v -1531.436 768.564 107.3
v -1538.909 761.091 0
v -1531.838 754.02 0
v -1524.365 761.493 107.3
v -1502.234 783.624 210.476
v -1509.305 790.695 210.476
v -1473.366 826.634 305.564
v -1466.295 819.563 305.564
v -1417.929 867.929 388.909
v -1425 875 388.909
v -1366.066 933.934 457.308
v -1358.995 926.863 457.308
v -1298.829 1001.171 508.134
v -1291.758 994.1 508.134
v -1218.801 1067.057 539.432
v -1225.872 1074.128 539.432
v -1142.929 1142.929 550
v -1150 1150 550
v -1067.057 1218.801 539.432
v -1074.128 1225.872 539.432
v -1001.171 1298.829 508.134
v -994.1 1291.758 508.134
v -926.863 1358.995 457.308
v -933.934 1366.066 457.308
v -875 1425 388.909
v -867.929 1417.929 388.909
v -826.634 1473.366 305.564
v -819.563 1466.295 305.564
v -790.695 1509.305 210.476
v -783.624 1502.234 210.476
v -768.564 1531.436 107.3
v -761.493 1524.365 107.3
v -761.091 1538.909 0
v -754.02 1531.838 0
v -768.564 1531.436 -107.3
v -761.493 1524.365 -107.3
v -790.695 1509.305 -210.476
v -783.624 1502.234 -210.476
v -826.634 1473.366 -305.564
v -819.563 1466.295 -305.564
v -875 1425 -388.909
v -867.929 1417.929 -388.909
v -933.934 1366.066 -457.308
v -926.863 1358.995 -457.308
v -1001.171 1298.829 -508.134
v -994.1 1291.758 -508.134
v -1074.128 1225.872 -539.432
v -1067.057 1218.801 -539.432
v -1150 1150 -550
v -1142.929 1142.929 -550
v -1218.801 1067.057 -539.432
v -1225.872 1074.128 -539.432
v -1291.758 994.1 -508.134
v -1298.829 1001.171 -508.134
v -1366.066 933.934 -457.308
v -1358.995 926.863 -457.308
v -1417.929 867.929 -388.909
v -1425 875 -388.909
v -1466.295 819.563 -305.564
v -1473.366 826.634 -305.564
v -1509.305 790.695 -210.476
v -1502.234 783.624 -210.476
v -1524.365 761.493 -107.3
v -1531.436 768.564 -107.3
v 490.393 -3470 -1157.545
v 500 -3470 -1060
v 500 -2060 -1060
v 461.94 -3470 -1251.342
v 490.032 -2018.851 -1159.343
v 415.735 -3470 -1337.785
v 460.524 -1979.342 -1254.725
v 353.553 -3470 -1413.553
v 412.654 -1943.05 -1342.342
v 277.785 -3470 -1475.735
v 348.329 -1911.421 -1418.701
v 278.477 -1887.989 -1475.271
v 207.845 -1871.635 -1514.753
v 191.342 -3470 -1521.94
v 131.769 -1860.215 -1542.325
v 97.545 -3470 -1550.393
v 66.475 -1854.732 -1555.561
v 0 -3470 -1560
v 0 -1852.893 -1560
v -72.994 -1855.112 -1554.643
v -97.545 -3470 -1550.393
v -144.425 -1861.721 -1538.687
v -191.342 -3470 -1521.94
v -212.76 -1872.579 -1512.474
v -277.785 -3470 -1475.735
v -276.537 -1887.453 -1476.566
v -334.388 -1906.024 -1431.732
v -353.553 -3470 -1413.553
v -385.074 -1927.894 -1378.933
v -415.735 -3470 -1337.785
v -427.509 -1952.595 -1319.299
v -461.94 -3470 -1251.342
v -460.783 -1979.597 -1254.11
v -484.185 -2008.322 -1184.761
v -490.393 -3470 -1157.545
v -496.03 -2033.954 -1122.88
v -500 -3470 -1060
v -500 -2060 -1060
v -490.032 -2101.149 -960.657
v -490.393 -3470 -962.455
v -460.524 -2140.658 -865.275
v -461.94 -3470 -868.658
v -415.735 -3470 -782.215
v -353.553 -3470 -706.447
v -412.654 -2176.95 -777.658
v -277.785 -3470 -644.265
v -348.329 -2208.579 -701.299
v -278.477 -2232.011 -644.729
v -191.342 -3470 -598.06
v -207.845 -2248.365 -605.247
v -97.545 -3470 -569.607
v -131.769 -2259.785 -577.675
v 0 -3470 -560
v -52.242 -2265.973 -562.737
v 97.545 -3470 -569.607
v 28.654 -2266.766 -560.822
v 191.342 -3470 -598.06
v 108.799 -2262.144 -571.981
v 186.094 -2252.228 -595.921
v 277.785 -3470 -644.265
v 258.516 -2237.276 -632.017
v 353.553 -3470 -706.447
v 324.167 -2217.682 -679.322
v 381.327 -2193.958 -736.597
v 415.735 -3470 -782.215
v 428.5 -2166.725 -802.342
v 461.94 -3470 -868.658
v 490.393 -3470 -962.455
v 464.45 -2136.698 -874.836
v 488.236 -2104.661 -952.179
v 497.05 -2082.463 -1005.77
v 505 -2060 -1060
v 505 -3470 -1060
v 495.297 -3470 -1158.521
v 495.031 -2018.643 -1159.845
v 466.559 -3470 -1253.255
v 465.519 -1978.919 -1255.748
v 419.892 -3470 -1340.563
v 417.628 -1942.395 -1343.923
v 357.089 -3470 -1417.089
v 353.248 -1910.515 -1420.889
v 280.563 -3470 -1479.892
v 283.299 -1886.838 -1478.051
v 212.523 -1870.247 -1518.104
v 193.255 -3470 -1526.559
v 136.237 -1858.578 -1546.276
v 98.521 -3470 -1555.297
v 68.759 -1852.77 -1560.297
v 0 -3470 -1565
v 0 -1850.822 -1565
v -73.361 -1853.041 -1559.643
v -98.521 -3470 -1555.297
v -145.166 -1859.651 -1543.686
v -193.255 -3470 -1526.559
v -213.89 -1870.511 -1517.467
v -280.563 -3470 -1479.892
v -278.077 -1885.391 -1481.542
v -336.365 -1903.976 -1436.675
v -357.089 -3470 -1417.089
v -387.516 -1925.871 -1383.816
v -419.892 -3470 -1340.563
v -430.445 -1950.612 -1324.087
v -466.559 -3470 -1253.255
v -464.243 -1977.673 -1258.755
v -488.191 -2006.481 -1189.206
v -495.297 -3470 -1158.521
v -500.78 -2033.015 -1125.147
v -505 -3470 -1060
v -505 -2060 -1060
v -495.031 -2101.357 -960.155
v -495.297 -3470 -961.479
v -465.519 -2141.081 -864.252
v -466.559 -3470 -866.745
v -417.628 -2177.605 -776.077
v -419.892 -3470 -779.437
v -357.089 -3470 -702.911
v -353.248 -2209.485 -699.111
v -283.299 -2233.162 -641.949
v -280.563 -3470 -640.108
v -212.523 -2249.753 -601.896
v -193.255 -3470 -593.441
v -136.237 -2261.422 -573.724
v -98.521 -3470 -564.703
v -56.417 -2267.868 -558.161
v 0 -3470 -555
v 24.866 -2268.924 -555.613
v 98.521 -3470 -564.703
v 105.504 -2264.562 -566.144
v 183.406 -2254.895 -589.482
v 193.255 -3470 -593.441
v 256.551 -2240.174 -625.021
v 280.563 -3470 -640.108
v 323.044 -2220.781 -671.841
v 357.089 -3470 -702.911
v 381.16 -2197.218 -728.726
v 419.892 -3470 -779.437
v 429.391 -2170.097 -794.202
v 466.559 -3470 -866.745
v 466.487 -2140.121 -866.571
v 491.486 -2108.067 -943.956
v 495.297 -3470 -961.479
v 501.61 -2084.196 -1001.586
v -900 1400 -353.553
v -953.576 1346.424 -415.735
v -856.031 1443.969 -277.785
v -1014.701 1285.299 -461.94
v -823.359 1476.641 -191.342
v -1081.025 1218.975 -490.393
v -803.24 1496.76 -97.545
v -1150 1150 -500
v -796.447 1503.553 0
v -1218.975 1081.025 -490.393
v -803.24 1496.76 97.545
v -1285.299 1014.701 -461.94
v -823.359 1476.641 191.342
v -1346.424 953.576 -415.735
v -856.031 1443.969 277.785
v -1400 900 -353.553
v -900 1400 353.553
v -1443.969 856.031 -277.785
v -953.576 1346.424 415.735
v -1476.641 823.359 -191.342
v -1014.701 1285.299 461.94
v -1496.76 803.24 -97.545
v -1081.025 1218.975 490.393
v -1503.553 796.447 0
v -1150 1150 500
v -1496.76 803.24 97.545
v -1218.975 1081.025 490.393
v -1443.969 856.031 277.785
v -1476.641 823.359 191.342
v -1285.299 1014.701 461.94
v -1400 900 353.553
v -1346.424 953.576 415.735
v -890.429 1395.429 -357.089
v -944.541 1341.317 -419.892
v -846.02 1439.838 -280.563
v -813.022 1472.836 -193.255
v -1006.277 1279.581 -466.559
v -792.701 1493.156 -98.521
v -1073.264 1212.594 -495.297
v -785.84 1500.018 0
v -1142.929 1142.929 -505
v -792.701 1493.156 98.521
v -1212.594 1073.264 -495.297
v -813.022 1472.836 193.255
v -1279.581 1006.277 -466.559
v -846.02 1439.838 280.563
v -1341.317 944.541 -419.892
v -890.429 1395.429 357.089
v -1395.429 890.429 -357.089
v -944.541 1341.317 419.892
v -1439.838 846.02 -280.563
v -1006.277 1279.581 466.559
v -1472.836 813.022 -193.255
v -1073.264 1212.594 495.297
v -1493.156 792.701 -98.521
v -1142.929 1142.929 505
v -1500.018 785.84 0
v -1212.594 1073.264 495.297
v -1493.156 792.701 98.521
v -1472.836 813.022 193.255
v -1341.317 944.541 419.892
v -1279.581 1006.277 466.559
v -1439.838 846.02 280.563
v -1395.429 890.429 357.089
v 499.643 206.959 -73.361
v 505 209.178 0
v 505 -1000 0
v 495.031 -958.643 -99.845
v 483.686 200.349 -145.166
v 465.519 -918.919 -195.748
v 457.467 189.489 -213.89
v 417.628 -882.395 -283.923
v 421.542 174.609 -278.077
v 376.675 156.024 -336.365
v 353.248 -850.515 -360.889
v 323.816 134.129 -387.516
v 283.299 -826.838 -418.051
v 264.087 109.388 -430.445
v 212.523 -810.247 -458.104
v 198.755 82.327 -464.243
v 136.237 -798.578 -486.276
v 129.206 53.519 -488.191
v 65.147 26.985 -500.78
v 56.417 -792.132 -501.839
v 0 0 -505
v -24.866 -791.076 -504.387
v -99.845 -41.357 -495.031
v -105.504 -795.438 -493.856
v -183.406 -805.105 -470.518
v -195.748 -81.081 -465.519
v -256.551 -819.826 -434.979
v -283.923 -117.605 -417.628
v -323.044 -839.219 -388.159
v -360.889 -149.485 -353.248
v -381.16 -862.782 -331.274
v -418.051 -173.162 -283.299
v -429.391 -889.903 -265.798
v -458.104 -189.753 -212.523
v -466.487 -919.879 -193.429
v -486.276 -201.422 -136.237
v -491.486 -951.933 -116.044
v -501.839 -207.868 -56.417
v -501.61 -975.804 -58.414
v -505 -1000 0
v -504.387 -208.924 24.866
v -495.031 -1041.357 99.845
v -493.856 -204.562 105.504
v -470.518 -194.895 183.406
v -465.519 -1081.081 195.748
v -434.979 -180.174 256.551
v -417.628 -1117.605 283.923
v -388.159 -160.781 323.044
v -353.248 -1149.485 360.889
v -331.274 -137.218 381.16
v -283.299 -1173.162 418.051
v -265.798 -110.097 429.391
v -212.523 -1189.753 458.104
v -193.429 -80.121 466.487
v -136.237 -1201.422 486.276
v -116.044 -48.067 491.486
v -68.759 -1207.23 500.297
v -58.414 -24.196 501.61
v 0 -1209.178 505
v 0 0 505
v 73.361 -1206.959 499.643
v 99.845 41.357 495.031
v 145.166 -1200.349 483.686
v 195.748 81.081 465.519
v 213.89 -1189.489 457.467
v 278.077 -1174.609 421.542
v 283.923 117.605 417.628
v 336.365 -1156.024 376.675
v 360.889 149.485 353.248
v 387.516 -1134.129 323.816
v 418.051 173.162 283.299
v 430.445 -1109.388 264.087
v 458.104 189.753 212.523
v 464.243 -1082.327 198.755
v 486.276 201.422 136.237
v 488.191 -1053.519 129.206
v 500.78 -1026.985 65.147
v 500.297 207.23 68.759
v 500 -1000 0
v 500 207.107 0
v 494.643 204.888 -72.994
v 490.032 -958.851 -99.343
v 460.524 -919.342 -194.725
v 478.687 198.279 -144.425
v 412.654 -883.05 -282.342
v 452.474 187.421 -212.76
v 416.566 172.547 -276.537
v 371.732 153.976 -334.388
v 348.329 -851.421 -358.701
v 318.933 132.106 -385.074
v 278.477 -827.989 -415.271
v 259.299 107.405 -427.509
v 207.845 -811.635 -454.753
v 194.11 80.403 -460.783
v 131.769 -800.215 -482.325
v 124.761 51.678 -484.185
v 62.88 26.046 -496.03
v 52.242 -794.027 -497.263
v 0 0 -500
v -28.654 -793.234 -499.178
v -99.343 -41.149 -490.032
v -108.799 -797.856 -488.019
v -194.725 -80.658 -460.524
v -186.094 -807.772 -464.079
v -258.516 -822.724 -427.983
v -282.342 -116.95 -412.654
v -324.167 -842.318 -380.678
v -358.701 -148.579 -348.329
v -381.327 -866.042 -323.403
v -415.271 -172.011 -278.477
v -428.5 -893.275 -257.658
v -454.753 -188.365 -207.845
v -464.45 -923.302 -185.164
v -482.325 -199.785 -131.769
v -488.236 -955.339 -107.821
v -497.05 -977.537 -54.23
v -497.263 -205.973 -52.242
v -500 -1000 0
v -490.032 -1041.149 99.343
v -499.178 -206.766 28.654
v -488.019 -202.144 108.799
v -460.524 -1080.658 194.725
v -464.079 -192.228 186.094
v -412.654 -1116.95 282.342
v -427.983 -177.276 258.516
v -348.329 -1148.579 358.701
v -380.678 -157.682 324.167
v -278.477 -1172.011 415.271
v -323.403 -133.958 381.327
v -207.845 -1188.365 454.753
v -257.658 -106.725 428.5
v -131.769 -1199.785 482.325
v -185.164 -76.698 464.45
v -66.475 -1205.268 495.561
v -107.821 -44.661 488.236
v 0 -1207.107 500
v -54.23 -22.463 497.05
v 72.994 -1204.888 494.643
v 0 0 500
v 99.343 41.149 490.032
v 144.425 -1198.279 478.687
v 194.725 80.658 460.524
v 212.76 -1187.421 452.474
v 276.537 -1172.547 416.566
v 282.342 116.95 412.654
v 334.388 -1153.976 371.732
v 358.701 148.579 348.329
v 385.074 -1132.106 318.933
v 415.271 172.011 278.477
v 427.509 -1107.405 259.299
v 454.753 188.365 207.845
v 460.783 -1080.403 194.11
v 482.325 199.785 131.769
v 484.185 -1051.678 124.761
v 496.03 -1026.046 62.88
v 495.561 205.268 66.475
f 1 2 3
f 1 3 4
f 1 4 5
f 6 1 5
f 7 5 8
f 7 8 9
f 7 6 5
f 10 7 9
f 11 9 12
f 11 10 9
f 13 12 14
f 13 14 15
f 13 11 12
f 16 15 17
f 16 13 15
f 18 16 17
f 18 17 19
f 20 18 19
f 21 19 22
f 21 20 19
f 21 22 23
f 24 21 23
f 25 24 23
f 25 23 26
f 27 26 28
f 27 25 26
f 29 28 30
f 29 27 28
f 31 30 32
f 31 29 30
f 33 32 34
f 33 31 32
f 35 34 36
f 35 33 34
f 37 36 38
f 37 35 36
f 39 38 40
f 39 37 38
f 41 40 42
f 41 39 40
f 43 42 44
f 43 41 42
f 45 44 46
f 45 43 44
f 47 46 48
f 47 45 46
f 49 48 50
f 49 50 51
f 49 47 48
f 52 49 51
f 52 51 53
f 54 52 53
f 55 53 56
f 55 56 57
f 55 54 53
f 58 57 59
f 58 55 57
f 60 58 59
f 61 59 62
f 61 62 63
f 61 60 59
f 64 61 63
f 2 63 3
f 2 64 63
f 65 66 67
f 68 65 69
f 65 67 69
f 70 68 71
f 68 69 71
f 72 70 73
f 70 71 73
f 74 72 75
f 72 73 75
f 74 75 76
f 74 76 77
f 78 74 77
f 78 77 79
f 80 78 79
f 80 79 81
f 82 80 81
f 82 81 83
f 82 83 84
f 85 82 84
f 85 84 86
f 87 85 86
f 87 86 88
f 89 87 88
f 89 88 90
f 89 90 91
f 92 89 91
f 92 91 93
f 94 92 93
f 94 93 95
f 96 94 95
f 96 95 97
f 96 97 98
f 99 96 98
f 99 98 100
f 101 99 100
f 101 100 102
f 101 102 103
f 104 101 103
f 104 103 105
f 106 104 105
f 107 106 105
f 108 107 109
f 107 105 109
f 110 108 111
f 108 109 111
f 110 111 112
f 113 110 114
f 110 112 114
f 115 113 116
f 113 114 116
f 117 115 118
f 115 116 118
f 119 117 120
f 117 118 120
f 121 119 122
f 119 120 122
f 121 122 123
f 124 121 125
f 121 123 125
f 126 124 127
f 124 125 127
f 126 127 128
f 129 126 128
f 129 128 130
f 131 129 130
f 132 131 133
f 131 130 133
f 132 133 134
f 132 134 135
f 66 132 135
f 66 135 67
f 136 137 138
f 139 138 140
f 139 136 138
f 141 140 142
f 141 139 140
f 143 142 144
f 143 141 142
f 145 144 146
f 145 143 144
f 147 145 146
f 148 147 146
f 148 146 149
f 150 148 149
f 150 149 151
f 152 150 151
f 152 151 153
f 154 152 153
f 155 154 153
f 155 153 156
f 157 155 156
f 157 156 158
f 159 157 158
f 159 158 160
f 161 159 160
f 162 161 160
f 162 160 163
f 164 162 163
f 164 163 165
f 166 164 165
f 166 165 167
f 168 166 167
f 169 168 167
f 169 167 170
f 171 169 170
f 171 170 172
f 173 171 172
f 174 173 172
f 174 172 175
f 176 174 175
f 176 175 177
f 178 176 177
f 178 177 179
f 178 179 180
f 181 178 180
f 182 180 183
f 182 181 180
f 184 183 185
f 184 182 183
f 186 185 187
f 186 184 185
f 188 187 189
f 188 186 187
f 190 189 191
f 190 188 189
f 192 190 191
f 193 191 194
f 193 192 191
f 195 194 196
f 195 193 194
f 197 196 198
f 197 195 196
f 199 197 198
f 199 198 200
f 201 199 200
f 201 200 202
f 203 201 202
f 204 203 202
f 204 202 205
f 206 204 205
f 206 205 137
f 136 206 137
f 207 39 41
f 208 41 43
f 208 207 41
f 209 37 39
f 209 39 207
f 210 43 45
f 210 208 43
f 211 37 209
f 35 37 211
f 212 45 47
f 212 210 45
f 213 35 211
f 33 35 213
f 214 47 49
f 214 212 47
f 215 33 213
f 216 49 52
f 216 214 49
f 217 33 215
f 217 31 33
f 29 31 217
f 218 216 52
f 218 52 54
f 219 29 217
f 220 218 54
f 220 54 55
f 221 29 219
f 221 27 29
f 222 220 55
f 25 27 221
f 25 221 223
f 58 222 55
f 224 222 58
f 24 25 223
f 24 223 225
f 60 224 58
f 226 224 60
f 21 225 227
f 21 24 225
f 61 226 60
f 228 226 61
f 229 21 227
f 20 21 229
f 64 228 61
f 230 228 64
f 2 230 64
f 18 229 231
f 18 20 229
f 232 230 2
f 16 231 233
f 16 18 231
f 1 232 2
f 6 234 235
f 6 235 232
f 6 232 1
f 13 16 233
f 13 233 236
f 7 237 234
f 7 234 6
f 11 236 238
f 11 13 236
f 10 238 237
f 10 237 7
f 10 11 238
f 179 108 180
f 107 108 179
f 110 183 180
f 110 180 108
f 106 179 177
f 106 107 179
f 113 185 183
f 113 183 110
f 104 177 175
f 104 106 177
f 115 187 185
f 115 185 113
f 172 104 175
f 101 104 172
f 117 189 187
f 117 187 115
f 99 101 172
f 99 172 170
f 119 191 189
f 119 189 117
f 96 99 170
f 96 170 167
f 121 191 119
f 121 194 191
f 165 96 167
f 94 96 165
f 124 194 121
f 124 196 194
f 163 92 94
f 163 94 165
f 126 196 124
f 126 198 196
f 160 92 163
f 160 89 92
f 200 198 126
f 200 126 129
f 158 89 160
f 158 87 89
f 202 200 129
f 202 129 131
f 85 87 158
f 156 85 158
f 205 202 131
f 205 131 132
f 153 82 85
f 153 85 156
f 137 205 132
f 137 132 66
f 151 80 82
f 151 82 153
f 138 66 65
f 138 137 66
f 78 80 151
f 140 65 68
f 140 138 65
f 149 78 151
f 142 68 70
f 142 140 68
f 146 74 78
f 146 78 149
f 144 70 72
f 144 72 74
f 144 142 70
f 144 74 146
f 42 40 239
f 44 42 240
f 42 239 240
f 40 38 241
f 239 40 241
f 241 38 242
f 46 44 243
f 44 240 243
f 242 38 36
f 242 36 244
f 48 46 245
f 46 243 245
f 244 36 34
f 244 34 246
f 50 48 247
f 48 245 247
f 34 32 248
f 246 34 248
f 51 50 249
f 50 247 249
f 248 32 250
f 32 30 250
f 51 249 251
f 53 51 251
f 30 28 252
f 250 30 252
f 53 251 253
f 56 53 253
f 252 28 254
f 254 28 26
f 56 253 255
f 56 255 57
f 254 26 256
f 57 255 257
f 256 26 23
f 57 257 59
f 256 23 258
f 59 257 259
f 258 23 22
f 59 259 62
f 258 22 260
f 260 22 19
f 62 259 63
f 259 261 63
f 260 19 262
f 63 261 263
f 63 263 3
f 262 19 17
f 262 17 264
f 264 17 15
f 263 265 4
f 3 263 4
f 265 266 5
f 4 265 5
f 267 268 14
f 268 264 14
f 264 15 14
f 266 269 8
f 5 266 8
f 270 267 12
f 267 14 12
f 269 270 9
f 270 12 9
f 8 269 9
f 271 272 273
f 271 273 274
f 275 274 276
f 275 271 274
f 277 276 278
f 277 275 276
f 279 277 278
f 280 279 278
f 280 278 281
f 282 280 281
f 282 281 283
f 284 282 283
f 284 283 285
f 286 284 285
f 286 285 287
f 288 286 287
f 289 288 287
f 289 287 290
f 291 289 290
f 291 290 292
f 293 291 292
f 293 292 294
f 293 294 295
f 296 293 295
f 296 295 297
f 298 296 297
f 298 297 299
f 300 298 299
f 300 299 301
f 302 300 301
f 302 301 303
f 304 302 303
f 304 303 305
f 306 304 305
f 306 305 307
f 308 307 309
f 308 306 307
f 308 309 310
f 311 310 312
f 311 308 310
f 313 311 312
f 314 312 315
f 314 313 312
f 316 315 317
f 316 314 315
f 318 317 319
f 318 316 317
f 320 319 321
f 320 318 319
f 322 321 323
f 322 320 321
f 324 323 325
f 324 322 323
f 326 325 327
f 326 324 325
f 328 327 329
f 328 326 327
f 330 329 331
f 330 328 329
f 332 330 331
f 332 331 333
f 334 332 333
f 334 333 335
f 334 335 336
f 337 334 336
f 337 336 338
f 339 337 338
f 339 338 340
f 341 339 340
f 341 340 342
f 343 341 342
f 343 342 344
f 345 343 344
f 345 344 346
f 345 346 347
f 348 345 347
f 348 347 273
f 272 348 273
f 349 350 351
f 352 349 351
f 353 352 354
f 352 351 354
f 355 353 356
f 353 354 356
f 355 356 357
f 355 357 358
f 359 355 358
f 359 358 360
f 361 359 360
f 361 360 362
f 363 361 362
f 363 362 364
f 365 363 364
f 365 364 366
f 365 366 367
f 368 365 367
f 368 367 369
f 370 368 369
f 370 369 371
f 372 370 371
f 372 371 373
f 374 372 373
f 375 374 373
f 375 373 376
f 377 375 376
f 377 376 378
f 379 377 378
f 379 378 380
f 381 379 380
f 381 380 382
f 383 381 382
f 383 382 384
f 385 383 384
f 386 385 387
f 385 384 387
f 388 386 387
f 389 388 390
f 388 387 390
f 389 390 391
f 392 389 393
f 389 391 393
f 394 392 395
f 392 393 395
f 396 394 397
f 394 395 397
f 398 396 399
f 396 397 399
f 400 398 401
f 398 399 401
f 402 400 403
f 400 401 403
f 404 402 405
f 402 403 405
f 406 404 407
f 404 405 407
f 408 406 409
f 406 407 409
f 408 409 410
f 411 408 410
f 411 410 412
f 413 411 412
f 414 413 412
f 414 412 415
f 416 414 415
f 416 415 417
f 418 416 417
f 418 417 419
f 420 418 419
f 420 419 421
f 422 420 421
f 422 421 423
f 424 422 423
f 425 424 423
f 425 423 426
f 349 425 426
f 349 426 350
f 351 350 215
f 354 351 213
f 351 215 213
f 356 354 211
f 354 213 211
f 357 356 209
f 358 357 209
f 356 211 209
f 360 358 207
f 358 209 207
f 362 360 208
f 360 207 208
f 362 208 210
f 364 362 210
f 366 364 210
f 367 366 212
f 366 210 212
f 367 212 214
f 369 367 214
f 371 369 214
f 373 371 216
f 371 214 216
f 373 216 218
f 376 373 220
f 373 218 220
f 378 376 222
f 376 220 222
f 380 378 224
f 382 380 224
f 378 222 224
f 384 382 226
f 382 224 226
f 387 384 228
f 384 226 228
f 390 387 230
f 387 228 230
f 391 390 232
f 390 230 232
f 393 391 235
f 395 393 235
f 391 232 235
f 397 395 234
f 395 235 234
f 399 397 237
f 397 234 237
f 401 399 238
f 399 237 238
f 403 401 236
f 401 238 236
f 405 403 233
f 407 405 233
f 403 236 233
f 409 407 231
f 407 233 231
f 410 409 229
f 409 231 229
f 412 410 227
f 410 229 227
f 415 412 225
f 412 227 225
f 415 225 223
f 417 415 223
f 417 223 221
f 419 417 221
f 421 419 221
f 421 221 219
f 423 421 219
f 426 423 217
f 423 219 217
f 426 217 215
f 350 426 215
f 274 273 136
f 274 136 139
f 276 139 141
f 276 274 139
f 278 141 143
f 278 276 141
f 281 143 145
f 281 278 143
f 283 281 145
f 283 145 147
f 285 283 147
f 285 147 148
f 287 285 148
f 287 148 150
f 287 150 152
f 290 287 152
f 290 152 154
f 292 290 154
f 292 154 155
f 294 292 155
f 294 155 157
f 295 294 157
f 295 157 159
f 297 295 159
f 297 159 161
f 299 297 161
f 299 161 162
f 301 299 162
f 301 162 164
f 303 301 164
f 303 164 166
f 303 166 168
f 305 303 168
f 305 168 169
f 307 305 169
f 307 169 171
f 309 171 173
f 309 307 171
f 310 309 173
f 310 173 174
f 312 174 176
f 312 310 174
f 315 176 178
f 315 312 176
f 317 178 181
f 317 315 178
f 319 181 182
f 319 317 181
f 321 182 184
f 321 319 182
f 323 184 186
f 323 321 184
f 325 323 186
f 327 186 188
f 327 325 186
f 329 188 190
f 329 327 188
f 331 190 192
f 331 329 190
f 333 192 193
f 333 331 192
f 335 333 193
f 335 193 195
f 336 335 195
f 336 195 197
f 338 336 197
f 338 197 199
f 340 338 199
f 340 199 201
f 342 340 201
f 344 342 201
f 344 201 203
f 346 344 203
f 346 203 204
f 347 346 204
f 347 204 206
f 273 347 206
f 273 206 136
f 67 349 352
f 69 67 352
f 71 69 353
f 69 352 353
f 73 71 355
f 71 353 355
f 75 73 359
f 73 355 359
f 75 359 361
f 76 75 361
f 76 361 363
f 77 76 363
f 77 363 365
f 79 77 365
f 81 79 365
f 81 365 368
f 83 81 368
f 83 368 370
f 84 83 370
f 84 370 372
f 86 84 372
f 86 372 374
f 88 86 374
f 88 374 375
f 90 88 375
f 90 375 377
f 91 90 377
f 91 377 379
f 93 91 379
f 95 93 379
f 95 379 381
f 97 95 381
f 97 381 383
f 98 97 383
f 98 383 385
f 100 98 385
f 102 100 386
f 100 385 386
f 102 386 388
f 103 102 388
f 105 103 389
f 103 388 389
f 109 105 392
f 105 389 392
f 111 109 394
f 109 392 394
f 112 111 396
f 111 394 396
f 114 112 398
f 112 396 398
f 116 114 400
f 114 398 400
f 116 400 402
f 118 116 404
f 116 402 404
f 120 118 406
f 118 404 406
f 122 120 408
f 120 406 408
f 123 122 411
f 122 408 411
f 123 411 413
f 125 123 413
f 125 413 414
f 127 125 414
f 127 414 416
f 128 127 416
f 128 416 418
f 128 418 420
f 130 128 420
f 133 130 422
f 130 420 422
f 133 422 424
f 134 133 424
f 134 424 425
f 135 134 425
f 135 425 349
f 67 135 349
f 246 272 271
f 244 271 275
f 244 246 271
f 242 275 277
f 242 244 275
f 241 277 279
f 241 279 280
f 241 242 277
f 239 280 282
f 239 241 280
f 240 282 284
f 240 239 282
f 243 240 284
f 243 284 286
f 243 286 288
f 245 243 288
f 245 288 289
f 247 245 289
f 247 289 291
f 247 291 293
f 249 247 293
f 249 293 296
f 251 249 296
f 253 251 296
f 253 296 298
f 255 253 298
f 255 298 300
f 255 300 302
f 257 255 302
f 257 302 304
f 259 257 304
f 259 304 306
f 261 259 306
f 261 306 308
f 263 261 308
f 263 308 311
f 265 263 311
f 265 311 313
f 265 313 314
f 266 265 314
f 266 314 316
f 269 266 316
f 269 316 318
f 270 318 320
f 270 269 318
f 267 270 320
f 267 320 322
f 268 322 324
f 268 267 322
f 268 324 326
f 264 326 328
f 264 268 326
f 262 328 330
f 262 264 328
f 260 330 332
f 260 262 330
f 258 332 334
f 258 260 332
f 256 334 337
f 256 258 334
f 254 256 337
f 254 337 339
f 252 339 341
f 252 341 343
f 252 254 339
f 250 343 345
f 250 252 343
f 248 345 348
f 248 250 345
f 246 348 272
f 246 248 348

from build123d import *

# Parameters (mm, degrees)
F3_R     = 505
F3_R_2   = 500
F5_R     = 550
F5_R_2   = 500
F6_DEPTH = 10


with BuildPart() as f4:
    # F4: sweep along a path in F1, F0
    with BuildLine(Plane.YZ) as f4_path:
        Line((-3470, -1060), (-2060, -1060))
        Line((-2060, -1060), (-1000, 0))
    with BuildLine(Plane.XY) as f4_path_2:
        Line((0, -1000), (0, 0))
        Line((0, 0), (-1150, 1150))
    # F3 (on offset) → F4 (sweep)
    with BuildSketch(Plane.XZ.offset(3470)):
        with Locations((0, -1060)):
            Circle(F3_R)
        with Locations((0, -1060)):
            Circle(F3_R_2, mode=Mode.SUBTRACT)
    sweep(path=f4_path.line + f4_path_2.line, transition=Transition.RIGHT)

    # F5 (on face) → F6 (join)
    with BuildSketch(Plane(origin=(-1150, 1150, 0), x_dir=(-0.7071067812, -0.7071067812, 0), z_dir=(-0.7071067812, 0.7071067812, 0))):
        Circle(F5_R)
        Circle(F5_R_2, mode=Mode.SUBTRACT)
    extrude(amount=-F6_DEPTH)


solid = f4.part
